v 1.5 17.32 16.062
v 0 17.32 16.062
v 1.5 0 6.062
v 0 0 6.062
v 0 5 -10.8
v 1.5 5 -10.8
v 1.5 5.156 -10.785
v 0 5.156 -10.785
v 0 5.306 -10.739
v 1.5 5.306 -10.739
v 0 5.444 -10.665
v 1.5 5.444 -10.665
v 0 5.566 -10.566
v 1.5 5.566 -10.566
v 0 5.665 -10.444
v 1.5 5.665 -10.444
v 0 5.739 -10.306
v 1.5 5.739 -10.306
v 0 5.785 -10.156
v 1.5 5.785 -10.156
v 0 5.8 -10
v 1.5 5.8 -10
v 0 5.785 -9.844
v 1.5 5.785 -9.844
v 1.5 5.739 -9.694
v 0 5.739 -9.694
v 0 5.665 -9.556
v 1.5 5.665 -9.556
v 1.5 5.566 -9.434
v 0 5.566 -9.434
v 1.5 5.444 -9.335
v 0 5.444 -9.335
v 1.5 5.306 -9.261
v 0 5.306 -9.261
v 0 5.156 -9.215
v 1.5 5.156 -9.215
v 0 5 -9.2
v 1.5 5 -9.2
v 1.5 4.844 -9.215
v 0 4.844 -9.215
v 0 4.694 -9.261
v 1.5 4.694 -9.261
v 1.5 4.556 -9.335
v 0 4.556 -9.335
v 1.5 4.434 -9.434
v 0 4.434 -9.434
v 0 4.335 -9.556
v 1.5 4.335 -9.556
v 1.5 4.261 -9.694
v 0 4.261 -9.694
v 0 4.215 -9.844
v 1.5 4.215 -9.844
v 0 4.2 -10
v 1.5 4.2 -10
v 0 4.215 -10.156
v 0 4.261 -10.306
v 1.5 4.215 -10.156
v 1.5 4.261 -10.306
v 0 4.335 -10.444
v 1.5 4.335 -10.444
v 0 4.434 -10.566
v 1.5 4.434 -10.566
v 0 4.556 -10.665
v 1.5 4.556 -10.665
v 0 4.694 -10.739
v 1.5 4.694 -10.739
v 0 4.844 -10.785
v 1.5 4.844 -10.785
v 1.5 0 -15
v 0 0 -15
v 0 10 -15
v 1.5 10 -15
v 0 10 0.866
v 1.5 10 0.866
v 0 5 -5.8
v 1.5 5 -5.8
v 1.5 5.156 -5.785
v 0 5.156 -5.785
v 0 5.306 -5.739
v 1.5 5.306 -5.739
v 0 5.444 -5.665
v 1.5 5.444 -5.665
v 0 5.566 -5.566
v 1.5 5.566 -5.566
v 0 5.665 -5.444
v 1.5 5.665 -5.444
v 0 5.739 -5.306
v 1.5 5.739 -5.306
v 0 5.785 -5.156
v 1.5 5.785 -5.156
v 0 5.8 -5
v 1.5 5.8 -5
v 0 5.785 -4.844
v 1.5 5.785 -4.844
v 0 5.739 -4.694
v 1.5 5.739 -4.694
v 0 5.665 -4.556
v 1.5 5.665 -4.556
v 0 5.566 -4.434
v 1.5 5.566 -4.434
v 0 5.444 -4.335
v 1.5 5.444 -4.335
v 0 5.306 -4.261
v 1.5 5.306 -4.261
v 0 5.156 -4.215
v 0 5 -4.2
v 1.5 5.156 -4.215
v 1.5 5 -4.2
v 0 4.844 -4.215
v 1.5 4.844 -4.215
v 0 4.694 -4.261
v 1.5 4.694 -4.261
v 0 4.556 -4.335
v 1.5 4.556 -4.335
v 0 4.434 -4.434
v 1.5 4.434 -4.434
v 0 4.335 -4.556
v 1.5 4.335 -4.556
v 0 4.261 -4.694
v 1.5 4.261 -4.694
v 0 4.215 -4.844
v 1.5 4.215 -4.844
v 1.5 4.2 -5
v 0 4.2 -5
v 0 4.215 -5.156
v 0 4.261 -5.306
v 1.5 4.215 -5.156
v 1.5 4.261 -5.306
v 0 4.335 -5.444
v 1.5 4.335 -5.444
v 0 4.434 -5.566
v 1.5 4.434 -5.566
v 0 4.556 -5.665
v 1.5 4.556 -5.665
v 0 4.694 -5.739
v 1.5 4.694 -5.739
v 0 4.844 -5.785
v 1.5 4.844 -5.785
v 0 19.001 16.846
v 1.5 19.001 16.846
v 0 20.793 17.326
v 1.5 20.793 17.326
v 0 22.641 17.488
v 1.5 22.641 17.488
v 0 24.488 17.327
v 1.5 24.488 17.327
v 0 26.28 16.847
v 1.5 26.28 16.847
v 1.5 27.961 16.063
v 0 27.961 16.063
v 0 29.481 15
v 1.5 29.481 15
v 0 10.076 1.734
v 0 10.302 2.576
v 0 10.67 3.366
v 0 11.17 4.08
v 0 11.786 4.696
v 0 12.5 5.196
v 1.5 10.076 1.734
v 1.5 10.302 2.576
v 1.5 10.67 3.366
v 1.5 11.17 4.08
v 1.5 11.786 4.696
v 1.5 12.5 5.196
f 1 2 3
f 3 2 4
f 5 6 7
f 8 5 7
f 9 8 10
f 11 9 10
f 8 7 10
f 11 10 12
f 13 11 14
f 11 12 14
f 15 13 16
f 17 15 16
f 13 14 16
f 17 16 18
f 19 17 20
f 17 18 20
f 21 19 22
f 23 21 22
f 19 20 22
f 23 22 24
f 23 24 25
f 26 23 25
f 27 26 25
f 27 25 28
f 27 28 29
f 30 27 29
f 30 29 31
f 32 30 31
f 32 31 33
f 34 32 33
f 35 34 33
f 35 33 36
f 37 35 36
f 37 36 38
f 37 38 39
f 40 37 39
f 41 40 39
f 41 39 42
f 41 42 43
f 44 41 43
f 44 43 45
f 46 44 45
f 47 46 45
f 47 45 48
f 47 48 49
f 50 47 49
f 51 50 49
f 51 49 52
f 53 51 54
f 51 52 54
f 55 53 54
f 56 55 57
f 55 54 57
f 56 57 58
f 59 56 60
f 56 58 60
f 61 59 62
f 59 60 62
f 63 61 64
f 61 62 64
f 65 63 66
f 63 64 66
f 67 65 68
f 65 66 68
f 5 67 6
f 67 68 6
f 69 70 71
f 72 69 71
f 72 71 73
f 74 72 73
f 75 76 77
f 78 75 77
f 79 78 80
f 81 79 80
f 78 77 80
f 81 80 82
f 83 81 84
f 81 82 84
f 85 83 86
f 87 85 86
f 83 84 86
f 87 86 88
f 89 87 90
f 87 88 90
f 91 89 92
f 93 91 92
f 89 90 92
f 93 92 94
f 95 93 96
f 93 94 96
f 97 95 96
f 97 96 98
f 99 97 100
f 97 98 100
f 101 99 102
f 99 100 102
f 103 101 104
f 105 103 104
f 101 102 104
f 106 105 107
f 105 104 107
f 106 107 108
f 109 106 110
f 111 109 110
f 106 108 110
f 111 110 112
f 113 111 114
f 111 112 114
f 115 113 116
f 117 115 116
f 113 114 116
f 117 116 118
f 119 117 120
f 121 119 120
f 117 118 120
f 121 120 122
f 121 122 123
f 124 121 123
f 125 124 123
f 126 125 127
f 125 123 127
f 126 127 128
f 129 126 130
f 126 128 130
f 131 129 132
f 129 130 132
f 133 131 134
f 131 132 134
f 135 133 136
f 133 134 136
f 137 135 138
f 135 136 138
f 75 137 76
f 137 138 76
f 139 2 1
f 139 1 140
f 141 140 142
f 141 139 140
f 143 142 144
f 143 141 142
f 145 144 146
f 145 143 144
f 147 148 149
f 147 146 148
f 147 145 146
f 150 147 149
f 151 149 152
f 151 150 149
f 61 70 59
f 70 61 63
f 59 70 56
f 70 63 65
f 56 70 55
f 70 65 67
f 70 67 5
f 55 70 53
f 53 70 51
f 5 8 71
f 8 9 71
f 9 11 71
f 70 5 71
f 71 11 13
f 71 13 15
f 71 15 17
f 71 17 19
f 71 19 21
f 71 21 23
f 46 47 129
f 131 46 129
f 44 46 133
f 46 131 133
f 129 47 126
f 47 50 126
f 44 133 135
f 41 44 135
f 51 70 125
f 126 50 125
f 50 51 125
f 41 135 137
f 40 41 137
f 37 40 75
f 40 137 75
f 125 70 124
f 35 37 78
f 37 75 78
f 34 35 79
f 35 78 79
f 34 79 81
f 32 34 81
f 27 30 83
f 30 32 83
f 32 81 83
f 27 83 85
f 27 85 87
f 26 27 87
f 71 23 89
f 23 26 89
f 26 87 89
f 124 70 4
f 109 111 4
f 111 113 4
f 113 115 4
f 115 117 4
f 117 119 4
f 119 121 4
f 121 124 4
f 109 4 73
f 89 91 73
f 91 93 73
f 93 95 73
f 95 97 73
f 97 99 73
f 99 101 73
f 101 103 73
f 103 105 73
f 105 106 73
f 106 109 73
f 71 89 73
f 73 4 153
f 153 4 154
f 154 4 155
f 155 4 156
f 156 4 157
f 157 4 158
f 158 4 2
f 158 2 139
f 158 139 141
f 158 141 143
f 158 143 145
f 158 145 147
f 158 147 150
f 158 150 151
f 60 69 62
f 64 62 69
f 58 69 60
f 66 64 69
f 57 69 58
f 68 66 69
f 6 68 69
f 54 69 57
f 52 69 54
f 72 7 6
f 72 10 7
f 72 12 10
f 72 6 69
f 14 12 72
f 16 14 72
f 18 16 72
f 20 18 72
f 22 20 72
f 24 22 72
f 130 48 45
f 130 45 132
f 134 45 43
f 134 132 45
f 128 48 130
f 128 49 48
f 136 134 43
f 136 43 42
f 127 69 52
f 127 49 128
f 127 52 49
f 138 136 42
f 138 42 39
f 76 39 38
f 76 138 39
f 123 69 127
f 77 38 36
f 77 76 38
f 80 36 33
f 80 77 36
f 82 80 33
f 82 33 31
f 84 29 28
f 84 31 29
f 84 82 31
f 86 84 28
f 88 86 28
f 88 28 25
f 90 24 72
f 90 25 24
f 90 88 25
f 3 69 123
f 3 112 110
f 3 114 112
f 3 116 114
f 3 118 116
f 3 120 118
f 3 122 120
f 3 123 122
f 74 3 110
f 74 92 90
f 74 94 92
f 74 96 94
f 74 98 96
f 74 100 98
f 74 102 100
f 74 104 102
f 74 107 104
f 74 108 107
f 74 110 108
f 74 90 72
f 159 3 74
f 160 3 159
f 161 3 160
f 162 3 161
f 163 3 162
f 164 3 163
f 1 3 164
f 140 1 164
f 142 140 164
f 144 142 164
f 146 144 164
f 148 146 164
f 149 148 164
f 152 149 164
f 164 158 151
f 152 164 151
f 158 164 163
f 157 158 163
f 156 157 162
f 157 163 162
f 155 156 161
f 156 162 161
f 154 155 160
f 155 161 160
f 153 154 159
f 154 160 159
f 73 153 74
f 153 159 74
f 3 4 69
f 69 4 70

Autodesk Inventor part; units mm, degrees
ref_plane "YZ Plane" through (0, 0, 0) normal (1, 0, 0) x (0, 1, 0)
ref_plane "XZ Plane" through (0, 0, 0) normal (0, 1, 0) x (-1, 0, 0)
ref_plane "XY Plane" through (0, 0, 0) normal (0, 0, 1) x (1, 0, 0)
sketch "スケッチ1" plane through (0, 0, 0) normal (1, 0, 0) x (0, 1, 0)
  line L0 (10, 0) -> (0, 0)
  line L1 (0, 0) -> (0, -15)
  line L2 (0, -15) -> (10, -15)
  line L3 (10, -15) -> (10, 0)
  line L4 (10, 0) -> (0, 0)
  line L5 (0, 0) -> (0, 6.0622)
  line L6 (0, 6.0622) -> (10, 6.0622)
  line L7 (10, 6.0622) -> (10, 0)
  line L8 (0, 6.0622) -> (3.5, 0)
  line L9 (3.5, 0) -> (29.4808, 15)
  line L10 (29.4808, 15) -> (25.9808, 21.0622)
  line L11 (25.9808, 21.0622) -> (0, 6.0622)
  arc A0 (29.4808, 15) -> (17.3205, 16.0622) centre (22.6419, 6.8452) ccw
  point P0 (10, 3.7528)
  dimension "d0" = 10
  dimension "d1" = 15
  dimension "d6" = 30
  dimension "d10" = 60
  dimension "d11" = 7
  dimension "d12" = 20
extrude "押し出し1" add sketch "スケッチ1" along normal blind 1.5 contours L3 L2 L1 L0 | L0 L9 L7 | L0 L5 L8 | L8 L6 L7 L9 | L7 L6 L11 A0 L9
fillet "フィレット2" radius 5 1 edges at (0.75, 10, 3.7528)
sketch "スケッチ2" plane through (1.5, 0, 0) normal (1, 0, 0) x (0, 0, -1)
  circle A0 centre (10, 5) radius 0.8
  circle A1 centre (5, 5) radius 0.8
  line L0 (15, 0) -> (15, 10) projected
  point P0 (0, 0)
  point P1 (15, 5)
  dimension "d14" = 1.6
  dimension "d15" = 1.6
  dimension "d16" = 5
  dimension "d17" = 5
extrude "押し出し2" cut sketch "スケッチ2" against normal through all
properties part number "claw2"
